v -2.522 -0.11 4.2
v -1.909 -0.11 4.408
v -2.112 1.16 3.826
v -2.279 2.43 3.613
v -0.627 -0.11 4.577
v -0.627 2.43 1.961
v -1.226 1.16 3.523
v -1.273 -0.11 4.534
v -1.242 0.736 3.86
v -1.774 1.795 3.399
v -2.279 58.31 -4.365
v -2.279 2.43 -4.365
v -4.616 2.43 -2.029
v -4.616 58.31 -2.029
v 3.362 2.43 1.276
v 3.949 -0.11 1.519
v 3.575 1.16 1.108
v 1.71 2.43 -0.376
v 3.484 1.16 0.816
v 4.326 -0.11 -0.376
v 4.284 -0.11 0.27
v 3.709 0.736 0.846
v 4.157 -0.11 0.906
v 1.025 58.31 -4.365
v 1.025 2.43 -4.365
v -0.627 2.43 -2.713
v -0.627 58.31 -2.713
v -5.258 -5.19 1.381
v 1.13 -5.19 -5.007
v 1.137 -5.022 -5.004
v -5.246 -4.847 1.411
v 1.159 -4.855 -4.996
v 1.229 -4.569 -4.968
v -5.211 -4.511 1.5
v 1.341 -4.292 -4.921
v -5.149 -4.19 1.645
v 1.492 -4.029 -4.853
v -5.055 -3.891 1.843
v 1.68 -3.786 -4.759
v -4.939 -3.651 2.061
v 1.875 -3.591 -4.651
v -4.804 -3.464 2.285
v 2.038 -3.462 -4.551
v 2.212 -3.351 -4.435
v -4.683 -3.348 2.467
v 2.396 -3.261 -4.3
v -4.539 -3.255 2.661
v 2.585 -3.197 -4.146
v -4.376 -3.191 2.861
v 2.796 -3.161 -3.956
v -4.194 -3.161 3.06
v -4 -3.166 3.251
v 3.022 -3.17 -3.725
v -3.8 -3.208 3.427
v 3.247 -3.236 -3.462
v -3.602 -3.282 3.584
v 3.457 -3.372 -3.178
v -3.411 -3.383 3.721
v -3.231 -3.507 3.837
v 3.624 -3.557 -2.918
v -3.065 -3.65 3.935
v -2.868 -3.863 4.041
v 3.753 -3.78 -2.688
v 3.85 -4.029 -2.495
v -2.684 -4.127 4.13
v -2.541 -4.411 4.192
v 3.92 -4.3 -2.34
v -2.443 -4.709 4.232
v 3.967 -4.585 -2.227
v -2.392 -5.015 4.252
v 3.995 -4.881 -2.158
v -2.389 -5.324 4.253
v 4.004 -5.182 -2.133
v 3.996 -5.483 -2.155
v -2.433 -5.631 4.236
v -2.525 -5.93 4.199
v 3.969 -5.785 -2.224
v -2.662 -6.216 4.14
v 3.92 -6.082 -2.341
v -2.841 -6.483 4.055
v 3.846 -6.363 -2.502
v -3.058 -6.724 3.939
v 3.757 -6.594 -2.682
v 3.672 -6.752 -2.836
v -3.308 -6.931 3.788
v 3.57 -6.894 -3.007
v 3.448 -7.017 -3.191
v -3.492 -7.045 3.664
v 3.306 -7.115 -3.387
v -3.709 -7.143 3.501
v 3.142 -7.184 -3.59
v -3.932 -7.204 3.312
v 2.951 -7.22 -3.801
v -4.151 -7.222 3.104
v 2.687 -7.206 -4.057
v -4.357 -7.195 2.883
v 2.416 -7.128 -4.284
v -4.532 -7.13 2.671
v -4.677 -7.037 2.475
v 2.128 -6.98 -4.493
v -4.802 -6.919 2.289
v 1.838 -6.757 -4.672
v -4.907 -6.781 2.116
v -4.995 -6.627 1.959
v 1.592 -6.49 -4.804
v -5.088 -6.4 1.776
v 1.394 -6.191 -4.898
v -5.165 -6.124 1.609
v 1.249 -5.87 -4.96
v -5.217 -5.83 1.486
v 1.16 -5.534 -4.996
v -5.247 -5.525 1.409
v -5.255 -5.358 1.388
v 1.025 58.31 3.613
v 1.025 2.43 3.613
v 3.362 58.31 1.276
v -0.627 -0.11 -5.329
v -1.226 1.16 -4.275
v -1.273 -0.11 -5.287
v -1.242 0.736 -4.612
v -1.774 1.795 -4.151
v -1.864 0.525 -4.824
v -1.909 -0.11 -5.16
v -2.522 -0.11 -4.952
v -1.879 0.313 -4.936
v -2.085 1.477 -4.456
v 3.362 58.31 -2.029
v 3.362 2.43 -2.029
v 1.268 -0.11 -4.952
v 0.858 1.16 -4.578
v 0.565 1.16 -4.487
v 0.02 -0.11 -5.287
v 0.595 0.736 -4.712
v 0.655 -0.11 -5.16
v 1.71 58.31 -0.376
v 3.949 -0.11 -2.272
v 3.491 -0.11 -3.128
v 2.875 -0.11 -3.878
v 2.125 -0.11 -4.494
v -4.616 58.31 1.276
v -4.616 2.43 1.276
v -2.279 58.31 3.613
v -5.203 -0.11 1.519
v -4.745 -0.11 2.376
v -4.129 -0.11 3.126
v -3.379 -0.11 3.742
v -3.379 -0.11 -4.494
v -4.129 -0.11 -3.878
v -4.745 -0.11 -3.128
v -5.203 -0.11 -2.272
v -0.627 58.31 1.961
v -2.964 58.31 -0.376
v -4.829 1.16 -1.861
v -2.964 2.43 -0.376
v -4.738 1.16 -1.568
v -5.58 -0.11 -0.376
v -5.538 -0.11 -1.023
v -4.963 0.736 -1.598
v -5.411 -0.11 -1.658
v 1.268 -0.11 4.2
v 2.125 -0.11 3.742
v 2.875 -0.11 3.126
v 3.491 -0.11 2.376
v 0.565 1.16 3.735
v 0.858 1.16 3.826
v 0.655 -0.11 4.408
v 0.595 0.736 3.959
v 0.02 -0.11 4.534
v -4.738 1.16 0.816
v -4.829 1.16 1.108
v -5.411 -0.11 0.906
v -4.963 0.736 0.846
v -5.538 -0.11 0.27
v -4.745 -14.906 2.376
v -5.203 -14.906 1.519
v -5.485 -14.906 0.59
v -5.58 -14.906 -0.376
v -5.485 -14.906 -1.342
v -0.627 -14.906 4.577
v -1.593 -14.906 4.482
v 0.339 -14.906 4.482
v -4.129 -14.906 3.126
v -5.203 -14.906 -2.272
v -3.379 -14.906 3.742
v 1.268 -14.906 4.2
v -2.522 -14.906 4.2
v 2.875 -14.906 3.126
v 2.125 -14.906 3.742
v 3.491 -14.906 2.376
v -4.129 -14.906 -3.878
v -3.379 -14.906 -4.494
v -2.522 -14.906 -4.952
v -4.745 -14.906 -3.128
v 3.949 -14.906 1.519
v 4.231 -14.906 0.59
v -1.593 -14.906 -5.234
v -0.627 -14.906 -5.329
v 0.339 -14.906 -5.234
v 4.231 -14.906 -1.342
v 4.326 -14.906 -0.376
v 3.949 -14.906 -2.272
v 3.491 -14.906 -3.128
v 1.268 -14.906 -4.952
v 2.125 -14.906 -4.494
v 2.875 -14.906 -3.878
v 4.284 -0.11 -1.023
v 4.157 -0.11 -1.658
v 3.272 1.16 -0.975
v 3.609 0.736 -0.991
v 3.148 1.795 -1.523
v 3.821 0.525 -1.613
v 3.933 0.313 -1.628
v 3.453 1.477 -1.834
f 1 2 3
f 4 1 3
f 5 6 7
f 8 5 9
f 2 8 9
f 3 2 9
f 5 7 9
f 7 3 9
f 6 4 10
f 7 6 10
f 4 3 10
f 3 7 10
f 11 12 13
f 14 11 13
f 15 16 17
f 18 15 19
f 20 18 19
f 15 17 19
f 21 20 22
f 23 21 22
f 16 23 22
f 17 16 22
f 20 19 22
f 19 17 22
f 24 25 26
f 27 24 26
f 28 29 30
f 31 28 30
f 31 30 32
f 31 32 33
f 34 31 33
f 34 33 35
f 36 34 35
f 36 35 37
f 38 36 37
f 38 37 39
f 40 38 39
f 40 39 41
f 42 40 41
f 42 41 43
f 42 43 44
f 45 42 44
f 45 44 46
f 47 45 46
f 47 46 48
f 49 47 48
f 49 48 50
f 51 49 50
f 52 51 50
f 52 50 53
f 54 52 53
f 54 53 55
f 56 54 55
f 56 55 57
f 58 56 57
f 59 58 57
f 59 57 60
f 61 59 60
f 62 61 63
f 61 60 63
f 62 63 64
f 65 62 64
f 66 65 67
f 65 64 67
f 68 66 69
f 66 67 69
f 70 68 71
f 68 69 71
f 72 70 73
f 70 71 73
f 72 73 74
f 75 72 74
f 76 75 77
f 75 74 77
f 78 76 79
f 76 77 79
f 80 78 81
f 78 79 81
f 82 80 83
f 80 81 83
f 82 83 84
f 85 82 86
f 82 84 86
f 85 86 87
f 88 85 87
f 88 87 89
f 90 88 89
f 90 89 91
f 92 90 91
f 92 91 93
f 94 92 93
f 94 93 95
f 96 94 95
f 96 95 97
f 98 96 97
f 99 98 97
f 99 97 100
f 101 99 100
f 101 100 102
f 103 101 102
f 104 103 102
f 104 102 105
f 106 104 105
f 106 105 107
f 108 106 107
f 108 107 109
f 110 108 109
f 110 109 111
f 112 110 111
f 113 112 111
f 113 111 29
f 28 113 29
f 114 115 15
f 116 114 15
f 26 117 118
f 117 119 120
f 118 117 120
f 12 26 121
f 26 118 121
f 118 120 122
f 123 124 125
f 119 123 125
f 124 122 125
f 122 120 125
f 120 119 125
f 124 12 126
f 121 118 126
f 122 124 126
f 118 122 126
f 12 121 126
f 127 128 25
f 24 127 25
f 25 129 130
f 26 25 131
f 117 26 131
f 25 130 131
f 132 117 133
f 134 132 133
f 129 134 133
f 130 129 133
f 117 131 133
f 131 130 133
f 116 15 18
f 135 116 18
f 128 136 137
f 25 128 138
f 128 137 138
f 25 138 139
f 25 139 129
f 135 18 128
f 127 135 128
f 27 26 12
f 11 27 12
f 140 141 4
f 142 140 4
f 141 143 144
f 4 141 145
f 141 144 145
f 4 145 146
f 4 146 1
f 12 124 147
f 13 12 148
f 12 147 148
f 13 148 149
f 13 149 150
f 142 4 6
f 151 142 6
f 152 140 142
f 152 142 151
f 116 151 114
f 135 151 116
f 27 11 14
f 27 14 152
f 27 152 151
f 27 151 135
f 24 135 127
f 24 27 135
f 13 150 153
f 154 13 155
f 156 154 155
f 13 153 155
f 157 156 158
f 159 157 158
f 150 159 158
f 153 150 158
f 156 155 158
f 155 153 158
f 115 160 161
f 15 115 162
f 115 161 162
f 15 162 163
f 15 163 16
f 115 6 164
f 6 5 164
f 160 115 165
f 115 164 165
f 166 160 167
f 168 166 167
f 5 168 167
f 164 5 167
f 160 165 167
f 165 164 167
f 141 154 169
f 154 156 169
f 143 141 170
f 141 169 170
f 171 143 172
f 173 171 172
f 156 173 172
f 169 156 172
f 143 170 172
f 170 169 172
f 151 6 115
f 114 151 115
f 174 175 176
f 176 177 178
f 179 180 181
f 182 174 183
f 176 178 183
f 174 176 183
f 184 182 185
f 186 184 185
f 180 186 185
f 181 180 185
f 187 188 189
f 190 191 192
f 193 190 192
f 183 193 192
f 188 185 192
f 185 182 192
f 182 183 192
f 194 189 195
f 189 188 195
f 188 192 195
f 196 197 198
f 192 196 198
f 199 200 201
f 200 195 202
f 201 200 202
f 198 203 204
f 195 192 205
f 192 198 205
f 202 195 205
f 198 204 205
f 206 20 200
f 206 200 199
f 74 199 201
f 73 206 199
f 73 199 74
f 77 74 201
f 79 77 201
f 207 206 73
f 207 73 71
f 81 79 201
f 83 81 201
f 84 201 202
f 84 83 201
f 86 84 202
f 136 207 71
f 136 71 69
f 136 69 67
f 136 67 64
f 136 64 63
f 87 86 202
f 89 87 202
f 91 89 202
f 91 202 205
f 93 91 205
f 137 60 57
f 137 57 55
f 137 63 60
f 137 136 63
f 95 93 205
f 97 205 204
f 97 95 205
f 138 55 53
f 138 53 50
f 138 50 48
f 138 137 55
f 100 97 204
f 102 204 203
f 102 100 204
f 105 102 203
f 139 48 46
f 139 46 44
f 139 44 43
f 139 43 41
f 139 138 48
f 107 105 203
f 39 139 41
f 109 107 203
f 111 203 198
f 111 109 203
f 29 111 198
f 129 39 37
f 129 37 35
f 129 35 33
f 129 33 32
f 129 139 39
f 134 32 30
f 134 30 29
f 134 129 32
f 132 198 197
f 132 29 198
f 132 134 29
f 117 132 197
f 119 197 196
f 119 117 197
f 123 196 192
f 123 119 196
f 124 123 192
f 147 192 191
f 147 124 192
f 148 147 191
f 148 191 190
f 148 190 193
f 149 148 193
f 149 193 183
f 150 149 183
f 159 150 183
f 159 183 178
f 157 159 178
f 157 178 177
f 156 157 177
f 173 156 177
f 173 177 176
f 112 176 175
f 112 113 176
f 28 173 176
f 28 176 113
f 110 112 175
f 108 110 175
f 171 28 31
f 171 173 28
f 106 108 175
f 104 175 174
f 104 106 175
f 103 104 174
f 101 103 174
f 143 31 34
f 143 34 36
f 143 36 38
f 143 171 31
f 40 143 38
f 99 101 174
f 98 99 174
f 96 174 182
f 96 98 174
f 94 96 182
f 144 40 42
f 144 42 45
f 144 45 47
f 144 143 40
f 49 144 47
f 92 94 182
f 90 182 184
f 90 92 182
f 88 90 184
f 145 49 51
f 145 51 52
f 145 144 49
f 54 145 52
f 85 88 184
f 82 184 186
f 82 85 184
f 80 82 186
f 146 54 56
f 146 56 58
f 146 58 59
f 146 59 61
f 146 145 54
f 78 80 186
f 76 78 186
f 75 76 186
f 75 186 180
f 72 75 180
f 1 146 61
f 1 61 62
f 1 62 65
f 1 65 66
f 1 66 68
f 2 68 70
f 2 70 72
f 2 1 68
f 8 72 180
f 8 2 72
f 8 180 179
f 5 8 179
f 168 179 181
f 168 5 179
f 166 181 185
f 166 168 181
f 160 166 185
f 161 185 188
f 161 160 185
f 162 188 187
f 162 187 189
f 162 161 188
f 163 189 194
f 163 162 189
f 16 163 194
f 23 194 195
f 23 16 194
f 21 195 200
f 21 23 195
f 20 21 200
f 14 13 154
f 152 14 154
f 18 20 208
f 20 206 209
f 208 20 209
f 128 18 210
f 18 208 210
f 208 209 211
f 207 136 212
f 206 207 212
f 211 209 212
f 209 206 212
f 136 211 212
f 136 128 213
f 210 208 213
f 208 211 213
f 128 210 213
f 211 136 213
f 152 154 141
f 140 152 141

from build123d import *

# Parameters (mm, degrees)
BOSS_EXTRUDE1_DEPTH = 60.739130435
SCALE1_SCALE        = 0.92
SKETCH4_R           = 4.953
SKETCH3_R           = 4.953
BOSS_EXTRUDE2_DEPTH = 14.7955
SKETCH5_R           = 2.032
CUT_EXTRUDE1_DEPTH  = 12.957599916


with BuildPart() as part:
    # Sketch1 → Boss-Extrude1 (new body)
    with BuildSketch(Plane(origin=(0, 0, 0), x_dir=(1, 0, 0), z_dir=(0, 1, 0))):
        Polygon((-0.6269783, 2.91618698), (-2.423029524, 4.712238204), (-4.963029524, 2.172238204), (-3.1669783, 0.37618698), (-4.963029524, -1.419864244), (-2.423029524, -3.959864244), (-0.6269783, -2.16381302), (1.169072924, -3.959864244), (3.709072924, -1.419864244), (1.9130217, 0.37618698), (3.709072924, 2.172238204), (1.169072924, 4.712238204), align=None)
    extrude(amount=BOSS_EXTRUDE1_DEPTH)


with BuildPart() as part_1:
    # Scale1: scaled about (-0.6269783, 30.369565217, -0.37618698)
    add(part.part.scale(SCALE1_SCALE).moved(Location((-0.050158264, 2.429565217, -0.030094958))))

    # Sketch4 → section 1 of loft1
    with BuildSketch(Plane(origin=(0, -0.110434783, 0), x_dir=(-1, 0, 0), z_dir=(0, -1, 0)), mode=Mode.PRIVATE) as loft1_s1:
        with Locations((0.6269783, 0.37618698)):
            Circle(SKETCH4_R)
    # loft from a face of the part (loft1)
    loft([part_1.faces().sort_by_distance((-0.6269783, 2.429565217, -0.37618698))[0], loft1_s1.sketch])

    # Sketch3 → Boss-Extrude2 (add)
    with BuildSketch(Plane(origin=(0, -0.110434783, 0), x_dir=(1, 0, 0), z_dir=(0, 1, 0))):
        with Locations((-0.6269783, 0.37618698)):
            Circle(SKETCH3_R)
    extrude(amount=-BOSS_EXTRUDE2_DEPTH)

    # Sketch5 → Cut-Extrude1 (cut, through all)
    with BuildSketch(Plane(origin=(3.376904227, 0, -3.376904227), x_dir=(-0.707106781, 0, -0.707106781), z_dir=(0.707106781, 0, -0.707106781))):
        with Locations((0.709344972, -5.190434783)):
            Circle(SKETCH5_R)
    extrude(amount=-CUT_EXTRUDE1_DEPTH, mode=Mode.SUBTRACT)


solid = part_1.part
